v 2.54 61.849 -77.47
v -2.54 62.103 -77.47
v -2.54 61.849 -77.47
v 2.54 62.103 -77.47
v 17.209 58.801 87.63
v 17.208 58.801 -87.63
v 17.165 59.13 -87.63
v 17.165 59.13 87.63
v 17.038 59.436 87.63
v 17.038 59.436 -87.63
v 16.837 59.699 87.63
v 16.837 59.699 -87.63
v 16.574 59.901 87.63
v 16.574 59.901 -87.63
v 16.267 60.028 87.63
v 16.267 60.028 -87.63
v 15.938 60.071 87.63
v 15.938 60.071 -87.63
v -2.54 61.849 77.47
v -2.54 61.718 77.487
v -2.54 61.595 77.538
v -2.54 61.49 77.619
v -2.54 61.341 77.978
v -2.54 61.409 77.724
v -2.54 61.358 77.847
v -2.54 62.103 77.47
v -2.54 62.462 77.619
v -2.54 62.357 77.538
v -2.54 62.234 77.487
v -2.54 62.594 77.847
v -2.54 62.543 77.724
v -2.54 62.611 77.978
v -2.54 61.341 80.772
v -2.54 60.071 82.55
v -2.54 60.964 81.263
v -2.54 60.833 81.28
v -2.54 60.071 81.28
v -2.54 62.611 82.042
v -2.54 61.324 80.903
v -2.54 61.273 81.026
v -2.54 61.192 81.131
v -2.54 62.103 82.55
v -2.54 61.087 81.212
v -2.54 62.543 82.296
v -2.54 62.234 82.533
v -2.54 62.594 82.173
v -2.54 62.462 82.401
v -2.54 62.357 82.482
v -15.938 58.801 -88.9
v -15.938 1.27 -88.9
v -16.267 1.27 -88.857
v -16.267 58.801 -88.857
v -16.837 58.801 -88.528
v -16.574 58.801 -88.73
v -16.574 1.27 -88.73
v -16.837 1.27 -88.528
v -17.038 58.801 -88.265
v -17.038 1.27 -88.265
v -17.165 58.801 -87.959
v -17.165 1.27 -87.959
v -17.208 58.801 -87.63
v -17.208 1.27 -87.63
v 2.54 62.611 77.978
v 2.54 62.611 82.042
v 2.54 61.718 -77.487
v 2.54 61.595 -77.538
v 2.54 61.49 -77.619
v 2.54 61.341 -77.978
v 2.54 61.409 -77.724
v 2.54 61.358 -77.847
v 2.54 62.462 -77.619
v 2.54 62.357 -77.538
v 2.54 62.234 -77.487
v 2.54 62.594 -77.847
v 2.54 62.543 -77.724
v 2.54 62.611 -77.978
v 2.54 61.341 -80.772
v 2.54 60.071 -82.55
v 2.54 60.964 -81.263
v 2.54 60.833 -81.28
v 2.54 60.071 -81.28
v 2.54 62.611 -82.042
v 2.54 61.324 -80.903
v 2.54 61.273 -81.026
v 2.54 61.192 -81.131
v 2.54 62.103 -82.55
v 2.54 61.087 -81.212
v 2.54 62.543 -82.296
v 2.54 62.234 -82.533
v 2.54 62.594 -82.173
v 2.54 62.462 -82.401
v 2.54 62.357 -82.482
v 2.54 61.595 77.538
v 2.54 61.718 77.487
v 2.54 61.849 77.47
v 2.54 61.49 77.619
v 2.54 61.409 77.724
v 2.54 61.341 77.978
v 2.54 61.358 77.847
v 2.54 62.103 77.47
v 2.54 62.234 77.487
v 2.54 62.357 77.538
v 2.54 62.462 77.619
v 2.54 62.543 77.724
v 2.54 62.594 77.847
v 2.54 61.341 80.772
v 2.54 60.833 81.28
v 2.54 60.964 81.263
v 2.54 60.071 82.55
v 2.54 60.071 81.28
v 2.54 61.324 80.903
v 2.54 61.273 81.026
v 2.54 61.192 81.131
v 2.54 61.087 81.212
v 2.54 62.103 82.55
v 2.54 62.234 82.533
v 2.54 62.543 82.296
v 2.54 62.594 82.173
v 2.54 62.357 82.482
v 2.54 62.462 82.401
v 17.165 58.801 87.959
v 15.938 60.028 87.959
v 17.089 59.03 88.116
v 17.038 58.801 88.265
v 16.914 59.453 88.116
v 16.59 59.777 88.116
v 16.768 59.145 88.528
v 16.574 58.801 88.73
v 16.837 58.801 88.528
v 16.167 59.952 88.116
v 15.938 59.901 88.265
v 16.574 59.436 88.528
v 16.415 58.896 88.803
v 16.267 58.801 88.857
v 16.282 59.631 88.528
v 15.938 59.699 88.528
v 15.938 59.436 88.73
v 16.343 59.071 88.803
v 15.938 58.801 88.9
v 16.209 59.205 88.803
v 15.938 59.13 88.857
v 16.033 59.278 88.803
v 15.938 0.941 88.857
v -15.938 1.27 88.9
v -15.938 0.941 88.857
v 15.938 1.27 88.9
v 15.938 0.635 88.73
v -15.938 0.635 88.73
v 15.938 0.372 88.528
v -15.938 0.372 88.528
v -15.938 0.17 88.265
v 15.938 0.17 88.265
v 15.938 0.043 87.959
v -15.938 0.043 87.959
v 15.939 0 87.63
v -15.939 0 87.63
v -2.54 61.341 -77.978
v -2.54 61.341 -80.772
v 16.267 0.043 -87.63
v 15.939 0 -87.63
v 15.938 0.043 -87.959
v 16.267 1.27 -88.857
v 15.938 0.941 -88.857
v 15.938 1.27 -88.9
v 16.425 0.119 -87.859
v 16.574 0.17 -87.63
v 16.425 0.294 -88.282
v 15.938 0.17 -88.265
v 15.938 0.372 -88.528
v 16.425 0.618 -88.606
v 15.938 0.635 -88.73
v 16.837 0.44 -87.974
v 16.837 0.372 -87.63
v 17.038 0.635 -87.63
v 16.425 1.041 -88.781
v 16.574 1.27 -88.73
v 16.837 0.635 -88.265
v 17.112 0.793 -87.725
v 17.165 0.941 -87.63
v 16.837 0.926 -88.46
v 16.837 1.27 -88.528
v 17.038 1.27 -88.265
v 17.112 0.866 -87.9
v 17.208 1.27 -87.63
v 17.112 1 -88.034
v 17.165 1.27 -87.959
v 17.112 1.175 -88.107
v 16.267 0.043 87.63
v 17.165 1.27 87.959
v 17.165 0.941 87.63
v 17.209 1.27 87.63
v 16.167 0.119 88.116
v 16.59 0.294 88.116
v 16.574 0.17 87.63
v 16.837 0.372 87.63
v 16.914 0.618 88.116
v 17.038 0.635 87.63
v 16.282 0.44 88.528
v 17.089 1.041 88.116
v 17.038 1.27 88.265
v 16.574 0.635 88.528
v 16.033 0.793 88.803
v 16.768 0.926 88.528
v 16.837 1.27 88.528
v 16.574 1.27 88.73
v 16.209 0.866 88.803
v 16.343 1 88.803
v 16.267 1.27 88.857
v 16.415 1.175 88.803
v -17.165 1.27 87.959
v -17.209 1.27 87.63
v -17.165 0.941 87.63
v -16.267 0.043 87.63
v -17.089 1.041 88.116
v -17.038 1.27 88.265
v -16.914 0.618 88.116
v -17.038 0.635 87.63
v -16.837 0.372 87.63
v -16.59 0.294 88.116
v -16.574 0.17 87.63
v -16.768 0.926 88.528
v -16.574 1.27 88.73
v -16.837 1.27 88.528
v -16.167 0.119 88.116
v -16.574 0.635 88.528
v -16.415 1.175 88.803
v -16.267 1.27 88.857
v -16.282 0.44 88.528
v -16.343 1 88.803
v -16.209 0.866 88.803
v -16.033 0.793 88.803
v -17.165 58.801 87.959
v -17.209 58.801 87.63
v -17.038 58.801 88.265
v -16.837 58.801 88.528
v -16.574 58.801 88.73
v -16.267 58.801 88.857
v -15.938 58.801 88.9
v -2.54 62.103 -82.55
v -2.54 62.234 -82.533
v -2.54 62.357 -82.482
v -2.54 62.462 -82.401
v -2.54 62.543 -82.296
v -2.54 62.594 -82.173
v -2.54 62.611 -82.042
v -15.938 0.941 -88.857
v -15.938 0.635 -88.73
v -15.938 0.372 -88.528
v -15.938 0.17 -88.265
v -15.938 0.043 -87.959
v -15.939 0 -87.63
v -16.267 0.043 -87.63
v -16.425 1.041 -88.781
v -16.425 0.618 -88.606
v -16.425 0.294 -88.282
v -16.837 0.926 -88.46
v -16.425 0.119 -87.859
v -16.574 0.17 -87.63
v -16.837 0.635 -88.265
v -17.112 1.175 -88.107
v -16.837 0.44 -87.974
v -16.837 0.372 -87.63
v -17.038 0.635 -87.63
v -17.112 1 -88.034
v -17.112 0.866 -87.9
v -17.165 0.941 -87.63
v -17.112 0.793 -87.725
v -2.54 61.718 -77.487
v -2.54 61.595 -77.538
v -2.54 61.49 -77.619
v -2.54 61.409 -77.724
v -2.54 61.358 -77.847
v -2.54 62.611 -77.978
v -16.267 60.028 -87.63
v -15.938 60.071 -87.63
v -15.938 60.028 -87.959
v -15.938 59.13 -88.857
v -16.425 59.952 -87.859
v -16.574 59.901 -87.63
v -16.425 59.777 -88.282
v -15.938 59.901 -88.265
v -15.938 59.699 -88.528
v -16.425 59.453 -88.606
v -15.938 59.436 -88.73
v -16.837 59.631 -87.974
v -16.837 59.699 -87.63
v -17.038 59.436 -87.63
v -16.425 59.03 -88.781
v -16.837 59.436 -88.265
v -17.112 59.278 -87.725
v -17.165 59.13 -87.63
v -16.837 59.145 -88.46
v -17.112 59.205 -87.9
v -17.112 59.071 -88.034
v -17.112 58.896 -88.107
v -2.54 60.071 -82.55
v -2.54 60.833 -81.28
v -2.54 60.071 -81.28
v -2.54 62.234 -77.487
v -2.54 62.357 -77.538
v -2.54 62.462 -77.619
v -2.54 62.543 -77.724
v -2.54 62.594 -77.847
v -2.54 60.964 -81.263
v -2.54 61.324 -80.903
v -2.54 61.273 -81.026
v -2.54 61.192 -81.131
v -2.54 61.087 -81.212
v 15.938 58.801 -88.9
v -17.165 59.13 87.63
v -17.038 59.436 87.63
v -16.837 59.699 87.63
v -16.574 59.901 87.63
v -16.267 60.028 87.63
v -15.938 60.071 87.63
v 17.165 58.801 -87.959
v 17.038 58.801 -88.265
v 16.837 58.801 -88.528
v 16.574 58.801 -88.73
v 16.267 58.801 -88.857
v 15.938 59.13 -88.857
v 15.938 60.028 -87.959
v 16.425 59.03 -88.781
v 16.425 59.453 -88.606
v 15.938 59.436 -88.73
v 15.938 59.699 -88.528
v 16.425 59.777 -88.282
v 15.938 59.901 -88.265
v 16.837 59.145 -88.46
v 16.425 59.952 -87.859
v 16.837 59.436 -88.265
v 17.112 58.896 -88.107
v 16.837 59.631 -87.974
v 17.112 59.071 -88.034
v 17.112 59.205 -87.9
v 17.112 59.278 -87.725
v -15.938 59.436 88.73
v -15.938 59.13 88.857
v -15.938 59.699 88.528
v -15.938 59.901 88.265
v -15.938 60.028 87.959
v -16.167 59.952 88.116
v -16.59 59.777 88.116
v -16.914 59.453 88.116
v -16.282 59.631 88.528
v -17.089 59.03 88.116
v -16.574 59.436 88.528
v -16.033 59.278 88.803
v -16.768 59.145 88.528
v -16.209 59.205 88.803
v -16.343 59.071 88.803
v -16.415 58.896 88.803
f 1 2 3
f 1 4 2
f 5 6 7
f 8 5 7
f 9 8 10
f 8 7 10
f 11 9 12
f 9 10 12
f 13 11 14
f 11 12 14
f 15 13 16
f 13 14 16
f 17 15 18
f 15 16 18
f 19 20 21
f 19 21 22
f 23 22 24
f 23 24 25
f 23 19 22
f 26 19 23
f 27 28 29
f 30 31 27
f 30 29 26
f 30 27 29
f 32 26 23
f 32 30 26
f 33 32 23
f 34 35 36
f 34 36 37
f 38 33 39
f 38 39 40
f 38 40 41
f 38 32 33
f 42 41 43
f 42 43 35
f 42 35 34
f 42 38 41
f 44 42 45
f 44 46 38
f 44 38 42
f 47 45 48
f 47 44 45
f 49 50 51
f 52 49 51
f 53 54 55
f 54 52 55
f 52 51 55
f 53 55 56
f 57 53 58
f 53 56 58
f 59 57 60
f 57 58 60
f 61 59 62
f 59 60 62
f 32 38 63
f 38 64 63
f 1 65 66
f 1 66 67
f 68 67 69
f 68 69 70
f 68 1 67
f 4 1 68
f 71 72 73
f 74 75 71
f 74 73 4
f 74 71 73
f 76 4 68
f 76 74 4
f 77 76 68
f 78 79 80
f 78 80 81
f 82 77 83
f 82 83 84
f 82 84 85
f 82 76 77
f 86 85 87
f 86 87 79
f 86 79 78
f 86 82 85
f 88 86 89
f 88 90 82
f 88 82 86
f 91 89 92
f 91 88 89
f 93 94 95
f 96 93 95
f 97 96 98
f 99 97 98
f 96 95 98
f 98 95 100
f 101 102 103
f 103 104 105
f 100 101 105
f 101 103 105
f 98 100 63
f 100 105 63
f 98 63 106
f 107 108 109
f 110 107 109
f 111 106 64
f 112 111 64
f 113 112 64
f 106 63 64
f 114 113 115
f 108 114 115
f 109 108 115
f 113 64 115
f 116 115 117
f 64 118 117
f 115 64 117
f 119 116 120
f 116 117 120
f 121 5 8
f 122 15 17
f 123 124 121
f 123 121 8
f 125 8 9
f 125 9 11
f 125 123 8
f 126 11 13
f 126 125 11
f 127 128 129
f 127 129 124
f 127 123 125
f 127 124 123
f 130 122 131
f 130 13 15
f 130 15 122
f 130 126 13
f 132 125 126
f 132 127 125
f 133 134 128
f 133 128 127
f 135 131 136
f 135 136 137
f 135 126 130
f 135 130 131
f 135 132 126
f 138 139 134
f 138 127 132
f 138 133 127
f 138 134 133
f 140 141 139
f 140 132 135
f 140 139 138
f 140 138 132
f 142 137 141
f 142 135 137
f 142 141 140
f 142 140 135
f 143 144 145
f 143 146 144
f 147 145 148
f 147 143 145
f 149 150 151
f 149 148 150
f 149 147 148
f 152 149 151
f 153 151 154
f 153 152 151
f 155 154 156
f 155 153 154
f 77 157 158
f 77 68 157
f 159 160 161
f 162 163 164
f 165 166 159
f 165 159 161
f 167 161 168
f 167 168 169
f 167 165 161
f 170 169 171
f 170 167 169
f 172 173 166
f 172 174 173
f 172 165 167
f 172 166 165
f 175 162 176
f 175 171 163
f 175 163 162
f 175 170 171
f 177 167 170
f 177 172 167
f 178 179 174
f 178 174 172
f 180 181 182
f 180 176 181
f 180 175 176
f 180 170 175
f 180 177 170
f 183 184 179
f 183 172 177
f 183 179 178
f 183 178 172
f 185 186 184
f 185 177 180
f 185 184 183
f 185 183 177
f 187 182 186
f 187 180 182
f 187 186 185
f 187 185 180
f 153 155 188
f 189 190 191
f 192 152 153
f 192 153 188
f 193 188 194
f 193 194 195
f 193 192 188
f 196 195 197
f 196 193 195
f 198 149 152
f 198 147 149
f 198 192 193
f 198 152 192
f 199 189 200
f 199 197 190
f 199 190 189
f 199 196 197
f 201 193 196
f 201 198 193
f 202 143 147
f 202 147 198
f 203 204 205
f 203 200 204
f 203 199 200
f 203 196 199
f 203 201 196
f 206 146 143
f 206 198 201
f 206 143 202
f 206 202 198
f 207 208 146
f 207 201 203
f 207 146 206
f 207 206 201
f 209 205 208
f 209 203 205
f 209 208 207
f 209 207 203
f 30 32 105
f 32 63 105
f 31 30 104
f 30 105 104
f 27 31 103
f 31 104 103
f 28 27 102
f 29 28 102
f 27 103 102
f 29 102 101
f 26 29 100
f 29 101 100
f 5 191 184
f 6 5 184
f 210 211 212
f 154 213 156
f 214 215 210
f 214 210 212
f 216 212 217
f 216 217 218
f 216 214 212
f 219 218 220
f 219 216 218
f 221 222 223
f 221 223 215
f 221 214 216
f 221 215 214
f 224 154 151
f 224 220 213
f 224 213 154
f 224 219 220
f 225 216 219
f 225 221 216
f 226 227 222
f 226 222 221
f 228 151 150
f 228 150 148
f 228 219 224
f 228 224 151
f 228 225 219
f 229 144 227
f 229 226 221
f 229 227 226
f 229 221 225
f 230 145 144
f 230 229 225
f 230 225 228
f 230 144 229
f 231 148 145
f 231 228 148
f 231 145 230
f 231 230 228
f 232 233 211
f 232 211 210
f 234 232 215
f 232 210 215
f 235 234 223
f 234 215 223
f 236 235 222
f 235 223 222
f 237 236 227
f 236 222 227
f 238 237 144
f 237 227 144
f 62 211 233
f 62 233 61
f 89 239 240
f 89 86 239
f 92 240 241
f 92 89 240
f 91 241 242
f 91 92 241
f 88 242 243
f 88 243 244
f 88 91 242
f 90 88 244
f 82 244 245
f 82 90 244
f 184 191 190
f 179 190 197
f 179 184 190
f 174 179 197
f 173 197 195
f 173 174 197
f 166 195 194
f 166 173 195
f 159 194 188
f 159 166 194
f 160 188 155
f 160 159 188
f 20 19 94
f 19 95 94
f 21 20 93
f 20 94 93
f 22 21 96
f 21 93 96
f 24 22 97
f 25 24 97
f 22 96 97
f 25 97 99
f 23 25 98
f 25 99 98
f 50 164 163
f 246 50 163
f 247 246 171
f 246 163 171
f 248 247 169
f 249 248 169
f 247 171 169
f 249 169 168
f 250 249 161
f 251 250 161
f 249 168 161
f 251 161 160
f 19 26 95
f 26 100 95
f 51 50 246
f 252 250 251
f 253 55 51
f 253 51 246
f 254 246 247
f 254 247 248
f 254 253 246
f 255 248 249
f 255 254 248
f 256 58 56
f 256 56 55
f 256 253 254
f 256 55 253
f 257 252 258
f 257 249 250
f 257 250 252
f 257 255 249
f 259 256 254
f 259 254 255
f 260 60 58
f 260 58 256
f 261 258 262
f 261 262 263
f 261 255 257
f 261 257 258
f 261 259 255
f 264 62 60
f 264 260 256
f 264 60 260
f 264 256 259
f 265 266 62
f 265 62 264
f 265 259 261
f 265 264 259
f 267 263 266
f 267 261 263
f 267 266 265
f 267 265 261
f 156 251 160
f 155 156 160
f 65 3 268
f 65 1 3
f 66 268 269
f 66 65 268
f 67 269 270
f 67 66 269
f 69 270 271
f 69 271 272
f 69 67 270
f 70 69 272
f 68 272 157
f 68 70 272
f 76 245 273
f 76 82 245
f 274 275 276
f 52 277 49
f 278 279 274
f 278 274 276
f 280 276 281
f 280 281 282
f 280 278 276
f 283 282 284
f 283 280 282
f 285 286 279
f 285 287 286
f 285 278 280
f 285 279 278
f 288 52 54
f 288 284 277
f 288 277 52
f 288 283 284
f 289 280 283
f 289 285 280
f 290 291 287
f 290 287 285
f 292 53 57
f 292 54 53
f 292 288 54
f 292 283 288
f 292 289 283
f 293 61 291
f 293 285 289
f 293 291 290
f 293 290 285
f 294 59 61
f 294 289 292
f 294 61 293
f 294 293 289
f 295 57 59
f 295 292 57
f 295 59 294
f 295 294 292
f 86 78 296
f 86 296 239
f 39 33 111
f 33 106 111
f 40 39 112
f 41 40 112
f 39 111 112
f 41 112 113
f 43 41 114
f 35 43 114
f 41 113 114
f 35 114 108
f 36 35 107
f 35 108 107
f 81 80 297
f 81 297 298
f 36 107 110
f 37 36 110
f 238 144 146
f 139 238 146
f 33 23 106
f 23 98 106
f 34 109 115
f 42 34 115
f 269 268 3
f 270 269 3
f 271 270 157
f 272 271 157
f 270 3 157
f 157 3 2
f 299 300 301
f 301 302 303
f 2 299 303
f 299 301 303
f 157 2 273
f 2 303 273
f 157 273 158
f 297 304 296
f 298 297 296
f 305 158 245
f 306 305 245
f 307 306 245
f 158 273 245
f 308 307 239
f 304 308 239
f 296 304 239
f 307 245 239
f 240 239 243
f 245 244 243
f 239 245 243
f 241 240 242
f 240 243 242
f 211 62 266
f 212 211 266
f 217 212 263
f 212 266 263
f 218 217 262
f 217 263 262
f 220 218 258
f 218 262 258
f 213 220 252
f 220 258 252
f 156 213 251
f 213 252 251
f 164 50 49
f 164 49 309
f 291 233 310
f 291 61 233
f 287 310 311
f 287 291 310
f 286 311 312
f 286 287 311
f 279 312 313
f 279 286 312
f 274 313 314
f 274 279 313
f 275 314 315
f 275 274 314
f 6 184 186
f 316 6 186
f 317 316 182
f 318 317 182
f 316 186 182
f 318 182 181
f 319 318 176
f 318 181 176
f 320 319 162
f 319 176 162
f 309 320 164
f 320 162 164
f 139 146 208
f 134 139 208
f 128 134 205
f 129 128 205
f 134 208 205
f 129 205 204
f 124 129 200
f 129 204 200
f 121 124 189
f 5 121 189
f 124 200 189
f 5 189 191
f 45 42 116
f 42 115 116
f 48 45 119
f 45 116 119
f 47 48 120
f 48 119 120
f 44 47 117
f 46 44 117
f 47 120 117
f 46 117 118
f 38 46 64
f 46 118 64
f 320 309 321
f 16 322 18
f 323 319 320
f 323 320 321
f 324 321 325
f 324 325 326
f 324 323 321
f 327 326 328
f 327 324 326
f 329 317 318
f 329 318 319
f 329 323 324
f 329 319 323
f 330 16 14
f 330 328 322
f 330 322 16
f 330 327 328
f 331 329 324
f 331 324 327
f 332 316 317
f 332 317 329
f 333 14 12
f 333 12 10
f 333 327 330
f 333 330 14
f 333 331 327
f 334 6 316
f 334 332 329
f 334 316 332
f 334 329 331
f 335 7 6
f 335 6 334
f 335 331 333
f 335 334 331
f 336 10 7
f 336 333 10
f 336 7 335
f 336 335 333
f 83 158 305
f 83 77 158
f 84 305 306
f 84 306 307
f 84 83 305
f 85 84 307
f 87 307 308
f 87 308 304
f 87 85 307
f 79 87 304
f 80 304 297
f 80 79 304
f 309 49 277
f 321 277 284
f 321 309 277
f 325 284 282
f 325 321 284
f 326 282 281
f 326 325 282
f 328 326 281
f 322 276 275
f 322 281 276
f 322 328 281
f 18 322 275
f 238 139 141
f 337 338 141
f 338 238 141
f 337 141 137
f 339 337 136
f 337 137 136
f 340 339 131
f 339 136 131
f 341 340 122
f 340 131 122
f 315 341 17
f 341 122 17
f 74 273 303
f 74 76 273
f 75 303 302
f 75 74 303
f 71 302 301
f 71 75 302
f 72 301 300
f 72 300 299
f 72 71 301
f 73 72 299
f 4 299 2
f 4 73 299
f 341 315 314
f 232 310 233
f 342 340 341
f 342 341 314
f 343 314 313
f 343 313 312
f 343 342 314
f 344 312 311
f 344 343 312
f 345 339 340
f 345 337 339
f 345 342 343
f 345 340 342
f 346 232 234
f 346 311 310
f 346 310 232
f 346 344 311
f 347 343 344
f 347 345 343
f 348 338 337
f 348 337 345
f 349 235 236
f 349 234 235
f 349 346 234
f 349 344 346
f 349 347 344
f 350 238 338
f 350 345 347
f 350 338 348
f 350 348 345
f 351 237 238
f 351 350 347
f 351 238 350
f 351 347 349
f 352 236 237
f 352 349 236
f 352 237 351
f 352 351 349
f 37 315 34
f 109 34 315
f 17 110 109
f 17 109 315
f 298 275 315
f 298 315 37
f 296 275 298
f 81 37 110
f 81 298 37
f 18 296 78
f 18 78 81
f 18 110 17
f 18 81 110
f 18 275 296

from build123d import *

# Parameters (mm, degrees)
SKETCH1_W           = 34.417
SKETCH1_H           = 177.8
BOSS_EXTRUDE1_DEPTH = 60.071
FILLET1_R           = 1.27
FILLET2_R           = 1.27
BOSS_EXTRUDE2_DEPTH = 2.54


with BuildPart() as part:
    # Sketch1 → Boss-Extrude1 (new body)
    with BuildSketch(Plane(origin=(0, 0, 0), x_dir=(1, 0, 0), z_dir=(0, 1, 0))):
        Rectangle(SKETCH1_W, SKETCH1_H)
    extrude(amount=BOSS_EXTRUDE1_DEPTH)

    # Fillet1
    fillet1_edges = [part.edges().sort_by_distance(p)[0] for p in [
        (17.2085, 60.071, 0),
        (0, 60.071, -88.9),
        (-17.2085, 60.071, 0),
        (0, 0, -88.9),
        (17.2085, 0, 0),
        (0, 0, 88.9),
        (-17.2085, 0, 0),
        (0, 60.071, 88.9),
    ]]
    fillet(fillet1_edges, radius=FILLET1_R)

    # Fillet2
    # the kernel refuses this fillet: 1.27 mm, written as the material it takes off along each edge
    with BuildSketch(Plane(origin=(-15.9385, 1.27, -87.63), x_dir=(0, 0, -1), z_dir=(-1, 0, 0))) as fillet2_piece_1_section:
        Polygon((0, 0), (FILLET2_R * 1.02, 0), (FILLET2_R * 1.02, FILLET2_R * 1.02), (0, FILLET2_R * 1.02), align=None)
    fillet2_piece_1 = extrude(amount=FILLET2_R * 1.02, mode=Mode.PRIVATE)
    fillet2_piece_1 = fillet2_piece_1 - Plane(origin=(-15.9385, 1.27, -87.63), x_dir=(0, 0.7071067811865475, 0.7071067811865475), z_dir=(-1, 0, 0)) * Sphere(FILLET2_R, mode=Mode.PRIVATE)
    add(fillet2_piece_1, mode=Mode.SUBTRACT)
    with BuildSketch(Plane(origin=(15.9385, 1.27, -87.63), x_dir=(0, 0, -1), z_dir=(1, 0, 0))) as fillet2_piece_2_section:
        Polygon((0, 0), (FILLET2_R * 1.02, 0), (FILLET2_R * 1.02, -FILLET2_R * 1.02), (0, -FILLET2_R * 1.02), align=None)
    fillet2_piece_2 = extrude(amount=FILLET2_R * 1.02, mode=Mode.PRIVATE)
    fillet2_piece_2 = fillet2_piece_2 - Plane(origin=(15.9385, 1.27, -87.63), x_dir=(0, 0.7071067811865475, 0.7071067811865475), z_dir=(1, 0, 0)) * Sphere(FILLET2_R, mode=Mode.PRIVATE)
    add(fillet2_piece_2, mode=Mode.SUBTRACT)
    with BuildSketch(Plane(origin=(-15.9385, 1.27, 87.63), x_dir=(-1, 0, 0), z_dir=(0, 0, 1))) as fillet2_piece_3_section:
        Polygon((0, 0), (FILLET2_R * 1.02, 0), (FILLET2_R * 1.02, FILLET2_R * 1.02), (0, FILLET2_R * 1.02), align=None)
    fillet2_piece_3 = extrude(amount=FILLET2_R * 1.02, mode=Mode.PRIVATE)
    fillet2_piece_3 = fillet2_piece_3 - Plane(origin=(-15.9385, 1.27, 87.63), x_dir=(0.7071067811865475, 0.7071067811865475, 0), z_dir=(0, 0, 1)) * Sphere(FILLET2_R, mode=Mode.PRIVATE)
    add(fillet2_piece_3, mode=Mode.SUBTRACT)
    with BuildSketch(Plane(origin=(15.9385, 1.27, 87.63), x_dir=(1, 0, 0), z_dir=(0, 0, 1))) as fillet2_piece_4_section:
        Polygon((0, 0), (FILLET2_R * 1.02, 0), (FILLET2_R * 1.02, -FILLET2_R * 1.02), (0, -FILLET2_R * 1.02), align=None)
    fillet2_piece_4 = extrude(amount=FILLET2_R * 1.02, mode=Mode.PRIVATE)
    fillet2_piece_4 = fillet2_piece_4 - Plane(origin=(15.9385, 1.27, 87.63), x_dir=(-0.7071067811865475, 0.7071067811865475, 0), z_dir=(0, 0, 1)) * Sphere(FILLET2_R, mode=Mode.PRIVATE)
    add(fillet2_piece_4, mode=Mode.SUBTRACT)
    with BuildSketch(Plane(origin=(15.9385, 58.801, 87.63), x_dir=(1, 0, 0), z_dir=(0, 0, 1))) as fillet2_piece_5_section:
        Polygon((0, 0), (FILLET2_R * 1.02, 0), (FILLET2_R * 1.02, FILLET2_R * 1.02), (0, FILLET2_R * 1.02), align=None)
    fillet2_piece_5 = extrude(amount=FILLET2_R * 1.02, mode=Mode.PRIVATE)
    fillet2_piece_5 = fillet2_piece_5 - Plane(origin=(15.9385, 58.801, 87.63), x_dir=(-0.7071067811865475, -0.7071067811865475, 0), z_dir=(0, 0, 1)) * Sphere(FILLET2_R, mode=Mode.PRIVATE)
    add(fillet2_piece_5, mode=Mode.SUBTRACT)
    with BuildSketch(Plane(origin=(-15.9385, 58.801, 87.63), x_dir=(-1, 0, 0), z_dir=(0, 0, 1))) as fillet2_piece_6_section:
        Polygon((0, 0), (FILLET2_R * 1.02, 0), (FILLET2_R * 1.02, -FILLET2_R * 1.02), (0, -FILLET2_R * 1.02), align=None)
    fillet2_piece_6 = extrude(amount=FILLET2_R * 1.02, mode=Mode.PRIVATE)
    fillet2_piece_6 = fillet2_piece_6 - Plane(origin=(-15.9385, 58.801, 87.63), x_dir=(0.7071067811865475, -0.7071067811865475, 0), z_dir=(0, 0, 1)) * Sphere(FILLET2_R, mode=Mode.PRIVATE)
    add(fillet2_piece_6, mode=Mode.SUBTRACT)
    with BuildSketch(Plane(origin=(15.9385, 58.801, -87.63), x_dir=(0, 0, -1), z_dir=(1, 0, 0))) as fillet2_piece_7_section:
        Polygon((0, 0), (FILLET2_R * 1.02, 0), (FILLET2_R * 1.02, FILLET2_R * 1.02), (0, FILLET2_R * 1.02), align=None)
    fillet2_piece_7 = extrude(amount=FILLET2_R * 1.02, mode=Mode.PRIVATE)
    fillet2_piece_7 = fillet2_piece_7 - Plane(origin=(15.9385, 58.801, -87.63), x_dir=(0, -0.7071067811865475, 0.7071067811865475), z_dir=(1, 0, 0)) * Sphere(FILLET2_R, mode=Mode.PRIVATE)
    add(fillet2_piece_7, mode=Mode.SUBTRACT)
    with BuildSketch(Plane(origin=(-15.9385, 58.801, -87.63), x_dir=(0, 0, -1), z_dir=(-1, 0, 0))) as fillet2_piece_8_section:
        Polygon((0, 0), (FILLET2_R * 1.02, 0), (FILLET2_R * 1.02, -FILLET2_R * 1.02), (0, -FILLET2_R * 1.02), align=None)
    fillet2_piece_8 = extrude(amount=FILLET2_R * 1.02, mode=Mode.PRIVATE)
    fillet2_piece_8 = fillet2_piece_8 - Plane(origin=(-15.9385, 58.801, -87.63), x_dir=(0, -0.7071067811865475, 0.7071067811865475), z_dir=(-1, 0, 0)) * Sphere(FILLET2_R, mode=Mode.PRIVATE)
    add(fillet2_piece_8, mode=Mode.SUBTRACT)
    with BuildSketch(Plane(origin=(17.2085, 1.27, 88.9), x_dir=(-1, 0, 0), z_dir=(0, 1, 0)), Plane(origin=(17.2085, 1.27, -88.9), x_dir=(0, 0, 1), z_dir=(0, 1, 0))) as fillet2_piece_9:
        with BuildLine():
            CenterArc((FILLET2_R, -FILLET2_R), FILLET2_R, 90, 90)
            Line((0, -FILLET2_R), (0, 0))
            Line((0, 0), (FILLET2_R, 0))
        make_face()
    extrude(amount=57.531, mode=Mode.SUBTRACT)
    with BuildSketch(Plane(origin=(-17.2085, 1.27, 88.9), x_dir=(1, 0, 0), z_dir=(0, 1, 0)), Plane(origin=(-17.2085, 1.27, -88.9), x_dir=(0, 0, 1), z_dir=(0, 1, 0))) as fillet2_piece_10:
        with BuildLine():
            CenterArc((FILLET2_R, FILLET2_R), FILLET2_R, 180, 90)
            Line((0, FILLET2_R), (0, 0))
            Line((0, 0), (FILLET2_R, 0))
        make_face()
    extrude(amount=57.531, mode=Mode.SUBTRACT)

    # Sketch2 → Boss-Extrude2 (add, symmetric)
    with BuildSketch(Plane(origin=(0, 0, 0), x_dir=(0, 0, -1), z_dir=(1, 0, 0))):
        with BuildLine():
            Line((-82.55, 60.071), (-82.55, 62.103))
            ThreePointArc((-82.55, 62.103), (-82.401210245, 62.462210245), (-82.042, 62.611))
            Line((-82.042, 62.611), (-77.978, 62.611))
            ThreePointArc((-77.978, 62.611), (-77.618789755, 62.462210245), (-77.47, 62.103))
            Line((-77.47, 62.103), (-77.47, 61.849))
            ThreePointArc((-77.47, 61.849), (-77.618789755, 61.489789755), (-77.978, 61.341))
            Line((-77.978, 61.341), (-80.772, 61.341))
            ThreePointArc((-80.772, 61.341), (-81.131210245, 61.192210245), (-81.28, 60.833))
            Line((-81.28, 60.833), (-81.28, 60.071))
            Line((-81.28, 60.071), (-82.55, 60.071))
        make_face()
    boss_extrude2 = extrude(amount=BOSS_EXTRUDE2_DEPTH, both=True)

    # Mirror1: Boss-Extrude2 across plane
    add(boss_extrude2.mirror(Plane.XY))


solid = part.part
